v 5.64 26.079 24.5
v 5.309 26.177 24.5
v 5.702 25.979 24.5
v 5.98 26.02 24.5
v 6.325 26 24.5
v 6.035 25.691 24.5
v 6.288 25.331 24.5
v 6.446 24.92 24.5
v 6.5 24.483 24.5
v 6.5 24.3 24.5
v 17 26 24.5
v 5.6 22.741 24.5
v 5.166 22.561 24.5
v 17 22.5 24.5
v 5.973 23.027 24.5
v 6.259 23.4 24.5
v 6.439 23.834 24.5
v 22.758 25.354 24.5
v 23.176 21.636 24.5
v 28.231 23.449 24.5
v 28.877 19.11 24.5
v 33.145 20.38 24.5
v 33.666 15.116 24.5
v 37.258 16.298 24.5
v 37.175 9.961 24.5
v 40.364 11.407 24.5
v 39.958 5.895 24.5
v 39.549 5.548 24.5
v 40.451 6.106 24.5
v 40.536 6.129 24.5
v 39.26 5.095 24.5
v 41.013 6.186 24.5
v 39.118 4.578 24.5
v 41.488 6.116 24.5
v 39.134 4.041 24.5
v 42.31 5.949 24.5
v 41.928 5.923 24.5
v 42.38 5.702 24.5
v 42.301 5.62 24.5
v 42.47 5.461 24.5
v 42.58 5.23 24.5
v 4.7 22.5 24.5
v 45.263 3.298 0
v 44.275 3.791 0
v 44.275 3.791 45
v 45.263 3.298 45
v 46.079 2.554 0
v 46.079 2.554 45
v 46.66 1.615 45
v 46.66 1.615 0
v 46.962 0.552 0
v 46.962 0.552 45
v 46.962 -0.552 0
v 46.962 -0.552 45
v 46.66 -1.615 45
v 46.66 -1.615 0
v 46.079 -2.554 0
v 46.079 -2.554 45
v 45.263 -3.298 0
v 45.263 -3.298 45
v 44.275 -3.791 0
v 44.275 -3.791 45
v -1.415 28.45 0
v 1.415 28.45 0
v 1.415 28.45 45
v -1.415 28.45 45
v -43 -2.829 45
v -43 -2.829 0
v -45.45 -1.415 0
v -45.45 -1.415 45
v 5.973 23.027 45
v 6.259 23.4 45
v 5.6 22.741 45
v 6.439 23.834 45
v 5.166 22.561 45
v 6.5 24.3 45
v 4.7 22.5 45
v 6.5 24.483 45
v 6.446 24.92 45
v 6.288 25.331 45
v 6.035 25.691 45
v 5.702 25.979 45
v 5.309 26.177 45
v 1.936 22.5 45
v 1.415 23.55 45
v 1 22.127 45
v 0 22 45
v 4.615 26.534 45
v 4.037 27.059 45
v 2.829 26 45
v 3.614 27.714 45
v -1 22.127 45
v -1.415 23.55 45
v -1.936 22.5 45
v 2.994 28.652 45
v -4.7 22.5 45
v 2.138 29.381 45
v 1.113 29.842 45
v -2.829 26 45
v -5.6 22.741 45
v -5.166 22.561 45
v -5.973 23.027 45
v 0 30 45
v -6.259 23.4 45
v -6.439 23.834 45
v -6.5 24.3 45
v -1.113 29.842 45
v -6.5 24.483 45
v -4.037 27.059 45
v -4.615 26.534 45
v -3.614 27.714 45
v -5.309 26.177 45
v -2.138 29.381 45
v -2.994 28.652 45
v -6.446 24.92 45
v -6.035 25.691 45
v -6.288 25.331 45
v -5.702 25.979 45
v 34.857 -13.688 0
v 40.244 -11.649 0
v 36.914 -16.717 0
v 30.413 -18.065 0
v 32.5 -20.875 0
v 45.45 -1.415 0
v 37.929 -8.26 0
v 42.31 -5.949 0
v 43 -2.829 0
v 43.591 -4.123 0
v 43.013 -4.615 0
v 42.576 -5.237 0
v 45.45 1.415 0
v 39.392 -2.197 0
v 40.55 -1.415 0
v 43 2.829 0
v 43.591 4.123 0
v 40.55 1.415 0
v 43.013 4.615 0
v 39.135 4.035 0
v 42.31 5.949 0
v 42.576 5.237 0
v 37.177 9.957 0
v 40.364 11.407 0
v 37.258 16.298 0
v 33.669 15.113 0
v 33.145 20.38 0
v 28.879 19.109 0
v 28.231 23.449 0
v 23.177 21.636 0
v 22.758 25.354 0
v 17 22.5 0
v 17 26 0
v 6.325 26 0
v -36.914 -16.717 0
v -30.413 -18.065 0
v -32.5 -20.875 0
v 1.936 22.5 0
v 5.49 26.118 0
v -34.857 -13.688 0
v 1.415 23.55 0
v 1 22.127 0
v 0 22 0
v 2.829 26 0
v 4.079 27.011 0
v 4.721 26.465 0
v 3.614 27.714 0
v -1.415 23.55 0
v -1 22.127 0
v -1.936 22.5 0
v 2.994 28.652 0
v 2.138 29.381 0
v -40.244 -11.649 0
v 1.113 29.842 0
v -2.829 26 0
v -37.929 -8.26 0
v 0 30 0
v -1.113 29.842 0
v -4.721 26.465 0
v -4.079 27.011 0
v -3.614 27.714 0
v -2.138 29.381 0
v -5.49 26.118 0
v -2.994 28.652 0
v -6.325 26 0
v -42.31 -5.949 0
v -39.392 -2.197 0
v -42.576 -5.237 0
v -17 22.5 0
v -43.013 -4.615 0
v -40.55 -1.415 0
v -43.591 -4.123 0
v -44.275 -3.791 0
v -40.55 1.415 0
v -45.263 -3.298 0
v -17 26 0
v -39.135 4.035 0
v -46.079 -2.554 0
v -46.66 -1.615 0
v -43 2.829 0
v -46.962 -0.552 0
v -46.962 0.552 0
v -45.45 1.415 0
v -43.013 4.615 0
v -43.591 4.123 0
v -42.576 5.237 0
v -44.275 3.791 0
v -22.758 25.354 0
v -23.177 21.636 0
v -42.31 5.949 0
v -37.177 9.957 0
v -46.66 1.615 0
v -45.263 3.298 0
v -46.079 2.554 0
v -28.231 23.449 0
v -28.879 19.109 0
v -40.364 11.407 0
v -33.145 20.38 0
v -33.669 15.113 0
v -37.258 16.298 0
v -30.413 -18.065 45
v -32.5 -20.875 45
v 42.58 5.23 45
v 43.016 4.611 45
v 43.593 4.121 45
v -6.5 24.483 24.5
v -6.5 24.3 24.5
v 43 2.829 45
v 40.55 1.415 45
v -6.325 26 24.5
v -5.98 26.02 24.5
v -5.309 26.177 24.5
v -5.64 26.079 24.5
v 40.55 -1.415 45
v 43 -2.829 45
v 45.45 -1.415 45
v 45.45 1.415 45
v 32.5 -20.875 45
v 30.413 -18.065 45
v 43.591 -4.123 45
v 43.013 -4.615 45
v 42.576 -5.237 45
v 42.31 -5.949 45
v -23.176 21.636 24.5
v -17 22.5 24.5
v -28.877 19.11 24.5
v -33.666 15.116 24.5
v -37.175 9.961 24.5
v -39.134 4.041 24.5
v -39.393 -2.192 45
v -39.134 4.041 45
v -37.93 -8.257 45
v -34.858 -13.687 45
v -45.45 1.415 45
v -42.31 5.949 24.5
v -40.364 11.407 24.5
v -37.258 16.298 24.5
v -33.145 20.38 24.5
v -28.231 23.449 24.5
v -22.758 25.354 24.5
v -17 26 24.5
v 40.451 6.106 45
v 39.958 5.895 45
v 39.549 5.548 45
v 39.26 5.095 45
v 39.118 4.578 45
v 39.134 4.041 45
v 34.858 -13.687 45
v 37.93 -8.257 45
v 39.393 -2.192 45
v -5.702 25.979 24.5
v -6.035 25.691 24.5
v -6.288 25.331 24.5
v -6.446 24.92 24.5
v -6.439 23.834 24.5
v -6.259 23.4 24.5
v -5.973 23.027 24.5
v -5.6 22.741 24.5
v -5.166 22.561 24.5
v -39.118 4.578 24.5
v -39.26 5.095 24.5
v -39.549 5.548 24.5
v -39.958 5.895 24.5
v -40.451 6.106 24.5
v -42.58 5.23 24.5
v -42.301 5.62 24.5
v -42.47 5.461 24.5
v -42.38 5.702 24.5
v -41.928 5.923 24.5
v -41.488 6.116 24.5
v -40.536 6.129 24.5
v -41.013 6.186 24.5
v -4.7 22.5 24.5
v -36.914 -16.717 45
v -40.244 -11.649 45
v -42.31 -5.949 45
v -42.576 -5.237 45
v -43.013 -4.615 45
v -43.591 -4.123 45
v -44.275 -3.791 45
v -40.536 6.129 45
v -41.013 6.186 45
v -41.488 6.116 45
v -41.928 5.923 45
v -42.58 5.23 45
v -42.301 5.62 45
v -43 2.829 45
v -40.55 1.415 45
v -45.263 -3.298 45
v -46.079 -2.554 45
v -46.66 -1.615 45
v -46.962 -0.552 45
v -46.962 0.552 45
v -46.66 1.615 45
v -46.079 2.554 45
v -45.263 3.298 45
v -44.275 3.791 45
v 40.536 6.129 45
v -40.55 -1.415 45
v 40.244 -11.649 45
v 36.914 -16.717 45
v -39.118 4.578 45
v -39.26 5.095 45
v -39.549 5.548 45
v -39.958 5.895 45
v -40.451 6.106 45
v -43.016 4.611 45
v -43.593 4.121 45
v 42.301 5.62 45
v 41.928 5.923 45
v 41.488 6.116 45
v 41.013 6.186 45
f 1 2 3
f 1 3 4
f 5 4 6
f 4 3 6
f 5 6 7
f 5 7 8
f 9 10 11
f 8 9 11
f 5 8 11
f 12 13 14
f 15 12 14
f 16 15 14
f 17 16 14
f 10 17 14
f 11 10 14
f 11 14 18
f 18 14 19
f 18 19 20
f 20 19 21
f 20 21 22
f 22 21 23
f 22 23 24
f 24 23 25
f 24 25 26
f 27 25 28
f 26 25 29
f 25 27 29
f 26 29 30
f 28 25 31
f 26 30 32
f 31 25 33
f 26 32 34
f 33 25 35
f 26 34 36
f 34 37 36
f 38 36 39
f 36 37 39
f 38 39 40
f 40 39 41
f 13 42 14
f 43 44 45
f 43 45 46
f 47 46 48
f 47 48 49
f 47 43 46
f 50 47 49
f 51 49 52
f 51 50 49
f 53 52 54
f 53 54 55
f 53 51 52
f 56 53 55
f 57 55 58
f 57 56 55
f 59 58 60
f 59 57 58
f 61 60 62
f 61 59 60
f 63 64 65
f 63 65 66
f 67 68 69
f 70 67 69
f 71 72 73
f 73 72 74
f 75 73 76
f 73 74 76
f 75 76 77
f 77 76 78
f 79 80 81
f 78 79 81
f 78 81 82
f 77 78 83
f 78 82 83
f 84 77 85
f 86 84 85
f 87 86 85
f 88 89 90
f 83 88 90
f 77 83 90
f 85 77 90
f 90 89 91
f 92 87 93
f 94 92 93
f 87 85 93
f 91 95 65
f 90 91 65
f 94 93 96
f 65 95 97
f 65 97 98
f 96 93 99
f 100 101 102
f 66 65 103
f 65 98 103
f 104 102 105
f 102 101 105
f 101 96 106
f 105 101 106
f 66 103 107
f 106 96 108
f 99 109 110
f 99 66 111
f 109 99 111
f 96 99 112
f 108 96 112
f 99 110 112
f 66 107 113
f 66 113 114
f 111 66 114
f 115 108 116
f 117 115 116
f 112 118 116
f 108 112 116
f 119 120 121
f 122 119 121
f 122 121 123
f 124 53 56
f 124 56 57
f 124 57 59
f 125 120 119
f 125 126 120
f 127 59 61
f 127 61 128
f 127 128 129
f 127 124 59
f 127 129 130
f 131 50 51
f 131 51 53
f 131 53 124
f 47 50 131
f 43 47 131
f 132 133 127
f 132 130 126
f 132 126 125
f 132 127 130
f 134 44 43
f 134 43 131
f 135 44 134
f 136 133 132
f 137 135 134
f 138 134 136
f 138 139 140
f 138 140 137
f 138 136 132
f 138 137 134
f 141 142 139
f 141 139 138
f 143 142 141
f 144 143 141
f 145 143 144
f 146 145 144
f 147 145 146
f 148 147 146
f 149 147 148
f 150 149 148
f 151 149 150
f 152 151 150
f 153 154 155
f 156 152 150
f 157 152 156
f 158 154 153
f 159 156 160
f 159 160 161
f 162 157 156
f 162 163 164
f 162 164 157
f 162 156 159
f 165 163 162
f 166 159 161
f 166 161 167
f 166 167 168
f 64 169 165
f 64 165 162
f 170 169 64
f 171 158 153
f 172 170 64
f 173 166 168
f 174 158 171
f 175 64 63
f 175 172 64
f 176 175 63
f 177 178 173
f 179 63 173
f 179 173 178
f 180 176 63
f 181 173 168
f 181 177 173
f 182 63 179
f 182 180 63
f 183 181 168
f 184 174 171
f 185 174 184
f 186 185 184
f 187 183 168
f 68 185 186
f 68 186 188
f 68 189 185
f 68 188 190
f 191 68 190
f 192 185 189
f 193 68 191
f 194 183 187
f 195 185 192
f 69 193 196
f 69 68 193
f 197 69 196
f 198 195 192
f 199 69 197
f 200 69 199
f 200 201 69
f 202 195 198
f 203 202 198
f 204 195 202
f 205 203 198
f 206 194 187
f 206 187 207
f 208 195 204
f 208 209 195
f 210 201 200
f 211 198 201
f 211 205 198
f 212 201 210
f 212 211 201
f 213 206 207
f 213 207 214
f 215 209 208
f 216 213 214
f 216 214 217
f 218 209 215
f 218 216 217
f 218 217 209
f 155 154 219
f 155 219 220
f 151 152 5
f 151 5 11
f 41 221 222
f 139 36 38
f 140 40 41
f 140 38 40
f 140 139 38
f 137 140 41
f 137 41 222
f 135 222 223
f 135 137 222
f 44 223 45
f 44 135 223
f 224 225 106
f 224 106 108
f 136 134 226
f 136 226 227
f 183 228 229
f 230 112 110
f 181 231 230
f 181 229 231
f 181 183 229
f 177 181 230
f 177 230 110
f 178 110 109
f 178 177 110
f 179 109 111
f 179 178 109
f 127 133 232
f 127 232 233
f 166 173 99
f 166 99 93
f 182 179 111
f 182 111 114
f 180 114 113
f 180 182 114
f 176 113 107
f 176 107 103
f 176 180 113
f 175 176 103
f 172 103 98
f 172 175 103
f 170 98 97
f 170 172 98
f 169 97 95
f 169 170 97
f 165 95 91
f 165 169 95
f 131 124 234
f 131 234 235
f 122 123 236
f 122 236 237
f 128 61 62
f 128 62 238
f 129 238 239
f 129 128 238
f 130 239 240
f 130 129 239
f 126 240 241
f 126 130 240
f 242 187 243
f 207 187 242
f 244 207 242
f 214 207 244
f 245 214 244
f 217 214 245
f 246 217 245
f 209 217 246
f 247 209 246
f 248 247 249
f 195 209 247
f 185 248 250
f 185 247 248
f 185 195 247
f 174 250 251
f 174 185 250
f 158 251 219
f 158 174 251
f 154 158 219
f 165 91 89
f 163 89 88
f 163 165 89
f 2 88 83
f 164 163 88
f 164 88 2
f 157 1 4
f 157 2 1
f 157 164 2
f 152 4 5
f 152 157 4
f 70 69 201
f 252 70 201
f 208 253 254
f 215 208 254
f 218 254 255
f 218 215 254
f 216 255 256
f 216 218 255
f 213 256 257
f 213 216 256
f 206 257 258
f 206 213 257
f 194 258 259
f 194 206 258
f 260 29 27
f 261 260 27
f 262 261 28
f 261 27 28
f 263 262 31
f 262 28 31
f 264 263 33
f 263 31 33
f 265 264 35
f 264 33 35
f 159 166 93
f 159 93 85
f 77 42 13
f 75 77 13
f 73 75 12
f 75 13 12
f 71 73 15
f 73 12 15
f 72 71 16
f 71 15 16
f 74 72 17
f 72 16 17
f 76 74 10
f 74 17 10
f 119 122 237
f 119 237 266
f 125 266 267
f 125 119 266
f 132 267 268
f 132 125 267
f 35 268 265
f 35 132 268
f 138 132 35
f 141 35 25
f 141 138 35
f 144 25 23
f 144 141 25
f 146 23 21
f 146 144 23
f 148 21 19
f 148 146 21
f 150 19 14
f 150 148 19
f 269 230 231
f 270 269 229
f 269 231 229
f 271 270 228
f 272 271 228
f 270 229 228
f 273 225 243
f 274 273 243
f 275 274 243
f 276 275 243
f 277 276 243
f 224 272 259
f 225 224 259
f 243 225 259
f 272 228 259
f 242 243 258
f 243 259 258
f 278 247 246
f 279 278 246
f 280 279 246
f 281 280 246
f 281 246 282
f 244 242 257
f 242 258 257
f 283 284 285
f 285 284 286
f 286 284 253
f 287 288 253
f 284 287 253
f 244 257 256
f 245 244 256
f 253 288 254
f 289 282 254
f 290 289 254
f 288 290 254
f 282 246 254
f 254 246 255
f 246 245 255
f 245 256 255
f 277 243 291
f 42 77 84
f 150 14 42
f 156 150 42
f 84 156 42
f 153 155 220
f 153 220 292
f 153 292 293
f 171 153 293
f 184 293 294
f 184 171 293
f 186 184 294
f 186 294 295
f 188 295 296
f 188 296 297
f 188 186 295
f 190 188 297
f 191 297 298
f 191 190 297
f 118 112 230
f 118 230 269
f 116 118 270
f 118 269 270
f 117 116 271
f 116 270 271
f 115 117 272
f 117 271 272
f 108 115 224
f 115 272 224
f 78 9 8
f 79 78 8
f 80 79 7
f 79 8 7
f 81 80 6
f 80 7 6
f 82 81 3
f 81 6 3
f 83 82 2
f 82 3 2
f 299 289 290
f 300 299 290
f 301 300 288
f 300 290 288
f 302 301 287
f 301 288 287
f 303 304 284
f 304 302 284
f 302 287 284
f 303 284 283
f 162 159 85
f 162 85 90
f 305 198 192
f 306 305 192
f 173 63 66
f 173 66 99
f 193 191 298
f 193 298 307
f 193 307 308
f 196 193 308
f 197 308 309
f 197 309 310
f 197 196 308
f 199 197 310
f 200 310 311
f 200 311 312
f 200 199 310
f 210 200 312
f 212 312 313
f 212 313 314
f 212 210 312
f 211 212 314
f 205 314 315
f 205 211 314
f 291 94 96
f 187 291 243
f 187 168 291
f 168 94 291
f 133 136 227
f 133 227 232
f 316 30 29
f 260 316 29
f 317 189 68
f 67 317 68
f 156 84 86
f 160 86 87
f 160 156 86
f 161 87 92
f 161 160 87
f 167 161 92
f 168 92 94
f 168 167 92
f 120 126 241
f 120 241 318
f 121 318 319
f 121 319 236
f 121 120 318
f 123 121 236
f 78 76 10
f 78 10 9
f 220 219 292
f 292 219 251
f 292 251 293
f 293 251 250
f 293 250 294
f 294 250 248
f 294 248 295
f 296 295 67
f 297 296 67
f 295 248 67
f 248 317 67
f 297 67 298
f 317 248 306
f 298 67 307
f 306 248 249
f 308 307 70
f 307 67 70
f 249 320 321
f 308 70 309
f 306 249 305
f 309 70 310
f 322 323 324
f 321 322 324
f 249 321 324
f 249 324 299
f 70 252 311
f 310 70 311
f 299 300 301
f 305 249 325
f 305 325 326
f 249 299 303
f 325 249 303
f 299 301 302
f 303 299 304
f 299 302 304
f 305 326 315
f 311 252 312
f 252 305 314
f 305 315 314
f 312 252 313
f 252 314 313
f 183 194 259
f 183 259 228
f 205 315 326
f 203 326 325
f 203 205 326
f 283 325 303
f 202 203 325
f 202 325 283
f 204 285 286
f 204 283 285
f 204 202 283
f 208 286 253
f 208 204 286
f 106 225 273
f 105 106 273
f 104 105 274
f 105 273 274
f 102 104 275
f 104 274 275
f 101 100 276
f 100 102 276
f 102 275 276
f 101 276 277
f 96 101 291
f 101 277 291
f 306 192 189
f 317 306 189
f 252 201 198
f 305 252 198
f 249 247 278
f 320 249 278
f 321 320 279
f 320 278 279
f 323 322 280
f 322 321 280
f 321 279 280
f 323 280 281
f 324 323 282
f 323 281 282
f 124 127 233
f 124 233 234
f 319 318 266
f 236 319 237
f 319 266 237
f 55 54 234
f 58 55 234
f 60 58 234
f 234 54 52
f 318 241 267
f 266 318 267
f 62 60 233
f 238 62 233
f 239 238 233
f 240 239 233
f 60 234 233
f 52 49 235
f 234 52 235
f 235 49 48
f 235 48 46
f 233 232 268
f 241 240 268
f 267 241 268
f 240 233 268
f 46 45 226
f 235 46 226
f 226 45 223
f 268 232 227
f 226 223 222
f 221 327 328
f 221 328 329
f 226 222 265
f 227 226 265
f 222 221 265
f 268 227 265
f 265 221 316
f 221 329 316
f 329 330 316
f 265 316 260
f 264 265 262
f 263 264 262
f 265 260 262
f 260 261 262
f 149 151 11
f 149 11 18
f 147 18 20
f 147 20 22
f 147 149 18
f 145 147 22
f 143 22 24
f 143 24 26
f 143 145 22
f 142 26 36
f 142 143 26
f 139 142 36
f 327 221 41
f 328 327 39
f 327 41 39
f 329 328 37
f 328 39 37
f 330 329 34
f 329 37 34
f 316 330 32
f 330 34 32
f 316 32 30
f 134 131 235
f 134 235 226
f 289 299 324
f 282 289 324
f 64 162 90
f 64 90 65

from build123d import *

# Parameters (mm, degrees)
EXTRUDE_1_DEPTH     = 45
CUT_EXTRUDE_START   = -20.5
CUT_EXTRUDE_1_DEPTH = 20.5
FILLET_1_R          = 1.8


with BuildPart() as part:
    # 草图2 → 凸台-拉伸1 (new body)
    with BuildSketch(Plane.XY):
        with BuildLine():
            Line((-17.000000000000004, 25.99999999999999), (-6.324555320336758, 25.999999999999996))
            ThreePointArc((-6.324555320336758, 25.999999999999996), (-4.720987868862212, 26.464537235814447), (-3.614031611621006, 27.71428571428571))
            ThreePointArc((-3.614031611621006, 27.71428571428571), (2.4e-16, 30), (3.614031611621006, 27.71428571428571))
            ThreePointArc((3.614031611621006, 27.71428571428571), (4.720987868862212, 26.464537235814447), (6.324555320336758, 25.999999999999996))
            Line((6.324555320336758, 25.999999999999996), (17.000000000000004, 25.99999999999999))
            ThreePointArc((17.000000000000004, 25.99999999999999), (33.14520180681835, 20.379707029717306), (42.310344827586206, 5.948650662854563))
            ThreePointArc((42.310344827586206, 5.948650662854563), (43.01263196777571, 4.615165346220191), (44.27472527472528, 3.7914476752259816))
            ThreePointArc((44.27472527472528, 3.7914476752259816), (47, -7.66e-15), (44.27472527472528, -3.791447675225999))
            ThreePointArc((44.27472527472528, -3.791447675225999), (43.01263196777571, -4.615165346220208), (42.310344827586206, -5.948650662854578))
            ThreePointArc((42.310344827586206, -5.948650662854578), (38.72710851162517, -14.280502642556568), (32.5, -20.874625745148098))
            Line((32.5, -20.874625745148098), (30.413461538461537, -18.064579971762782))
            ThreePointArc((30.413461538461537, -18.064579971762782), (38.36238574416096, 7.063885284860494), (17.000000000000007, 22.500000000000004))
            Line((17.000000000000007, 22.500000000000004), (1.9364916731037032, 22.499999999999996))
            ThreePointArc((1.9364916731037032, 22.499999999999996), (2.4e-16, 22), (-1.9364916731037032, 22.499999999999996))
            Line((-1.9364916731037032, 22.499999999999996), (-17.000000000000004, 22.500000000000004))
            ThreePointArc((-17.000000000000004, 22.500000000000004), (-38.36238574416096, 7.063885284860502), (-30.413461538461544, -18.064579971762775))
            Line((-30.413461538461544, -18.064579971762775), (-32.5, -20.874625745148098))
            ThreePointArc((-32.5, -20.874625745148098), (-38.727108511625175, -14.280502642556563), (-42.310344827586206, -5.948650662854575))
            ThreePointArc((-42.310344827586206, -5.948650662854575), (-43.01263196777571, -4.615165346220205), (-44.27472527472528, -3.7914476752259954))
            ThreePointArc((-44.27472527472528, -3.7914476752259954), (-46.99999999999999, -3.62e-15), (-44.27472527472527, 3.791447675225978))
            ThreePointArc((-44.27472527472527, 3.791447675225978), (-43.012631967775704, 4.615165346220189), (-42.310344827586206, 5.9486506628545595))
            ThreePointArc((-42.310344827586206, 5.9486506628545595), (-33.14520180681835, 20.379707029717306), (-17.000000000000004, 25.99999999999999))
        make_face()
        Polygon((1.414508159514589, 28.45), (-1.4145081595145819, 28.45), (-2.829016319029165, 26.000000000000004), (-1.4145081595145819, 23.549999999999997), (1.4145081595145816, 23.549999999999997), (2.829016319029169, 26.000000000000004), align=None, mode=Mode.SUBTRACT)
        Polygon((-43, -2.8290163190291664), (-45.44999999999999, -1.414508159514586), (-45.44999999999999, 1.4145081595145663), (-43, 2.8290163190291495), (-40.55, 1.4145081595145712), (-40.55, -1.414508159514584), align=None, mode=Mode.SUBTRACT)
        Polygon((45.44999999999999, -1.414508159514587), (45.44999999999999, 1.4145081595145672), (43, 2.8290163190291513), (40.55, 1.414508159514572), (40.55, -1.414508159514585), (43, -2.829016319029168), align=None, mode=Mode.SUBTRACT)
    extrude(amount=EXTRUDE_1_DEPTH)

    # 草图3 → 切除-拉伸1 (cut)
    with BuildSketch(Plane.XY.offset(45).offset(CUT_EXTRUDE_START)):
        with BuildLine():
            Line((-42.16101815897212, 6.551577306563255), (-38.773958022187415, 5.669634207602821))
            ThreePointArc((-38.773958022187415, 5.669634207602821), (-30.76014589909817, 17.801920818707508), (-17.000000000000004, 22.5))
            Line((-17.000000000000004, 22.5), (-6.499999999999999, 22.5))
            Line((-6.499999999999999, 22.5), (-6.500000000000001, 25.999999999999986))
            Line((-6.500000000000001, 25.999999999999986), (-17.000000000000004, 25.999999999999993))
            ThreePointArc((-17.000000000000004, 25.999999999999993), (-32.900613038957886, 20.57110850161755), (-42.16101815897212, 6.551577306563255))
        make_face()
        with BuildLine():
            Line((42.16101815897216, 6.551577306563108), (38.77395802218746, 5.669634207602693))
            ThreePointArc((38.77395802218746, 5.669634207602693), (30.760145899098227, 17.80192081870747), (17.000000000000007, 22.5))
            Line((17.000000000000007, 22.5), (6.500000000000001, 22.5))
            Line((6.500000000000001, 22.5), (6.500000000000003, 25.999999999999986))
            Line((6.500000000000003, 25.999999999999986), (17, 25.99999999999999))
            ThreePointArc((17, 25.99999999999999), (32.90061303895794, 20.57110850161751), (42.16101815897216, 6.551577306563108))
        make_face()
    extrude(amount=CUT_EXTRUDE_1_DEPTH, mode=Mode.SUBTRACT)

    # 圆角1
    # the kernel refuses this fillet: 1.8 mm, written as the material it takes off along each edge
    with BuildSketch(Plane(origin=(-6.499999999999999, 22.5, 24.5), x_dir=(-4.9e-16, 1, 0), z_dir=(0, 0, 1))) as fillet_1_piece_1:
        with BuildLine():
            CenterArc((FILLET_1_R, -FILLET_1_R), FILLET_1_R, 89.99999999999997, 89.99999999999997)
            Line((-4.44e-15, -FILLET_1_R), (0, 0))
            Line((0, 0), (FILLET_1_R, 0))
        make_face()
    extrude(amount=25, mode=Mode.SUBTRACT)
    with BuildSketch(Plane(origin=(-6.500000000000001, 25.999999999999986, 24.5), x_dir=(0.9891271990467642, 0.14706251767837725, 0), z_dir=(0, 0, 1))) as fillet_1_piece_2:
        with BuildLine():
            CenterArc((1.5573753123133534, -1.7649481565014509), FILLET_1_R, 101.3256751198377, 70.21759155918191)
            Line((-0.22305364597082192, -1.5002356246803719), (-0.4010965417992392, -1.473764371498264))
            Line((-0.4010965417992392, -1.473764371498264), (-0.17804289582841726, 0.02647125318210786))
            Line((-0.17804289582841726, 0.02647125318210786), (0.02647125318210786, 0.17804289582841726))
            ThreePointArc((0.02647125318210786, 0.17804289582841726), (0.2000083577650695, 0.15224155952387494), (1.168531917251559, 0.17649481565014538))
            Line((1.168531917251559, 0.17649481565014538), (1.203881316802631, -2e-17))
        make_face()
    extrude(amount=24.291816730260194, mode=Mode.SUBTRACT)
    with BuildSketch(Plane(origin=(6.500000000000001, 22.5, 24.5), x_dir=(-1, -1.97e-15, 0), z_dir=(0, 0, 1))) as fillet_1_piece_3:
        with BuildLine():
            CenterArc((FILLET_1_R, -FILLET_1_R), FILLET_1_R, 89.99999999999993, 89.99999999999996)
            Line((-4.44e-15, -FILLET_1_R), (0, 0))
            Line((0, 0), (FILLET_1_R, 0))
        make_face()
    extrude(amount=25, mode=Mode.SUBTRACT)
    with BuildSketch(Plane(origin=(6.500000000000003, 25.999999999999986, 24.5), x_dir=(-0.9891271990467642, 0.14706251767837714, 0), z_dir=(0, 0, 1))) as fillet_1_piece_4:
        with BuildLine():
            CenterArc((1.5573753123133545, 1.7649481565014509), FILLET_1_R, 188.4567333209804, 70.21759155918187)
            Line((-0.22305364597082086, 1.5002356246803719), (-0.40109654179923815, 1.4737643714982642))
            Line((-0.40109654179923815, 1.4737643714982642), (-0.17804289582841726, -0.02647125318210784))
            Line((-0.17804289582841726, -0.02647125318210784), (0.02647125318210784, -0.17804289582841726))
            ThreePointArc((0.02647125318210784, -0.17804289582841726), (0.20000835776506773, -0.15224155952387522), (1.1685319172515596, -0.17649481565014538))
            Line((1.1685319172515596, -0.17649481565014538), (1.2038813168026317, 2e-17))
        make_face()
    extrude(amount=24.291816730260194, mode=Mode.SUBTRACT)
    with BuildSketch(Plane(origin=(38.77395802218746, 5.669634207602693, 24.5), x_dir=(0.2159440686633983, -0.9764057349325113, 0), z_dir=(0, 0, 1))) as fillet_1_piece_5:
        with BuildLine():
            CenterArc((1.7345250396355076, 1.7987633090933175), FILLET_1_R, 182.12401133336417, 85.75197733327184)
            Line((-0.06423826945781225, 1.7320508075688776), (0, 0))
            ThreePointArc((0, 0), (0.8339062690555353, 0.01545863633349137), (1.6678125381110727, -6e-17))
        make_face()
    extrude(amount=24.83310408026317, mode=Mode.SUBTRACT)
    with BuildSketch(Plane(origin=(42.16101815897217, 6.551577306563109, 24.5), x_dir=(0.30232503982893916, -0.9532048941819542, 0), z_dir=(0, 0, 1))) as fillet_1_piece_6:
        with BuildLine():
            CenterArc((1.7095969183976014, -1.770799573138055), FILLET_1_R, 100.33438988529196, 76.6632370150231)
            Line((-0.08793234080970554, -1.6765204010286838), (-0.267685266730436, -1.667092483817746))
            Line((-0.267685266730436, -1.667092483817746), (-0.17975292592072528, 0.00942791721106288))
            Line((-0.17975292592072528, 0.00942791721106288), (0.00942791721106515, 0.17975292592072362))
            ThreePointArc((0.00942791721106515, 0.17975292592072362), (0.633577059222906, 0.1395355017085772), (1.3543993186778904, 0.1770799573138067))
            Line((1.3543993186778904, 0.1770799573138067), (1.3866900095614998, -3e-17))
        make_face()
    extrude(amount=24.697062031666952, mode=Mode.SUBTRACT)
    with BuildSketch(Plane(origin=(-38.773958022187415, 5.669634207602822, 24.5), x_dir=(-0.21594406866341104, -0.9764057349325085, 0), z_dir=(0, 0, 1))) as fillet_1_piece_7:
        with BuildLine():
            CenterArc((1.7345250396355227, -1.7987633090933188), FILLET_1_R, 92.12401133336449, 85.75197733327163)
            Line((-0.06423826945779765, -1.7320508075688876), (0, 0))
            ThreePointArc((0, 0), (0.8339062690555384, -0.01545863633350171), (1.6678125381110729, 3e-17))
        make_face()
    extrude(amount=24.833104080263197, mode=Mode.SUBTRACT)
    with BuildSketch(Plane(origin=(-42.16101815897213, 6.5515773065632565, 24.5), x_dir=(-0.30232503982891934, -0.9532048941819604, 0), z_dir=(0, 0, 1))) as fillet_1_piece_8:
        with BuildLine():
            CenterArc((1.7095969183976452, 1.770799573138059), FILLET_1_R, 183.00237309968935, 76.66323701501943)
            Line((-0.08793234080965445, 1.676520401028549), (-0.26768526673038506, 1.6670924838176002))
            Line((-0.26768526673038506, 1.6670924838176002), (-0.17975292592072462, -0.00942791721105888))
            Line((-0.17975292592072462, -0.00942791721105888), (0.00942791721106057, -0.1797529259207241))
            ThreePointArc((0.00942791721106057, -0.1797529259207241), (0.6335770592230675, -0.13953550170858298), (1.3543993186779588, -0.1770799573138045))
            Line((1.3543993186779588, -0.1770799573138045), (1.3866900095615668, 2e-17))
        make_face()
    extrude(amount=24.697062031666604, mode=Mode.SUBTRACT)


solid = part.part
